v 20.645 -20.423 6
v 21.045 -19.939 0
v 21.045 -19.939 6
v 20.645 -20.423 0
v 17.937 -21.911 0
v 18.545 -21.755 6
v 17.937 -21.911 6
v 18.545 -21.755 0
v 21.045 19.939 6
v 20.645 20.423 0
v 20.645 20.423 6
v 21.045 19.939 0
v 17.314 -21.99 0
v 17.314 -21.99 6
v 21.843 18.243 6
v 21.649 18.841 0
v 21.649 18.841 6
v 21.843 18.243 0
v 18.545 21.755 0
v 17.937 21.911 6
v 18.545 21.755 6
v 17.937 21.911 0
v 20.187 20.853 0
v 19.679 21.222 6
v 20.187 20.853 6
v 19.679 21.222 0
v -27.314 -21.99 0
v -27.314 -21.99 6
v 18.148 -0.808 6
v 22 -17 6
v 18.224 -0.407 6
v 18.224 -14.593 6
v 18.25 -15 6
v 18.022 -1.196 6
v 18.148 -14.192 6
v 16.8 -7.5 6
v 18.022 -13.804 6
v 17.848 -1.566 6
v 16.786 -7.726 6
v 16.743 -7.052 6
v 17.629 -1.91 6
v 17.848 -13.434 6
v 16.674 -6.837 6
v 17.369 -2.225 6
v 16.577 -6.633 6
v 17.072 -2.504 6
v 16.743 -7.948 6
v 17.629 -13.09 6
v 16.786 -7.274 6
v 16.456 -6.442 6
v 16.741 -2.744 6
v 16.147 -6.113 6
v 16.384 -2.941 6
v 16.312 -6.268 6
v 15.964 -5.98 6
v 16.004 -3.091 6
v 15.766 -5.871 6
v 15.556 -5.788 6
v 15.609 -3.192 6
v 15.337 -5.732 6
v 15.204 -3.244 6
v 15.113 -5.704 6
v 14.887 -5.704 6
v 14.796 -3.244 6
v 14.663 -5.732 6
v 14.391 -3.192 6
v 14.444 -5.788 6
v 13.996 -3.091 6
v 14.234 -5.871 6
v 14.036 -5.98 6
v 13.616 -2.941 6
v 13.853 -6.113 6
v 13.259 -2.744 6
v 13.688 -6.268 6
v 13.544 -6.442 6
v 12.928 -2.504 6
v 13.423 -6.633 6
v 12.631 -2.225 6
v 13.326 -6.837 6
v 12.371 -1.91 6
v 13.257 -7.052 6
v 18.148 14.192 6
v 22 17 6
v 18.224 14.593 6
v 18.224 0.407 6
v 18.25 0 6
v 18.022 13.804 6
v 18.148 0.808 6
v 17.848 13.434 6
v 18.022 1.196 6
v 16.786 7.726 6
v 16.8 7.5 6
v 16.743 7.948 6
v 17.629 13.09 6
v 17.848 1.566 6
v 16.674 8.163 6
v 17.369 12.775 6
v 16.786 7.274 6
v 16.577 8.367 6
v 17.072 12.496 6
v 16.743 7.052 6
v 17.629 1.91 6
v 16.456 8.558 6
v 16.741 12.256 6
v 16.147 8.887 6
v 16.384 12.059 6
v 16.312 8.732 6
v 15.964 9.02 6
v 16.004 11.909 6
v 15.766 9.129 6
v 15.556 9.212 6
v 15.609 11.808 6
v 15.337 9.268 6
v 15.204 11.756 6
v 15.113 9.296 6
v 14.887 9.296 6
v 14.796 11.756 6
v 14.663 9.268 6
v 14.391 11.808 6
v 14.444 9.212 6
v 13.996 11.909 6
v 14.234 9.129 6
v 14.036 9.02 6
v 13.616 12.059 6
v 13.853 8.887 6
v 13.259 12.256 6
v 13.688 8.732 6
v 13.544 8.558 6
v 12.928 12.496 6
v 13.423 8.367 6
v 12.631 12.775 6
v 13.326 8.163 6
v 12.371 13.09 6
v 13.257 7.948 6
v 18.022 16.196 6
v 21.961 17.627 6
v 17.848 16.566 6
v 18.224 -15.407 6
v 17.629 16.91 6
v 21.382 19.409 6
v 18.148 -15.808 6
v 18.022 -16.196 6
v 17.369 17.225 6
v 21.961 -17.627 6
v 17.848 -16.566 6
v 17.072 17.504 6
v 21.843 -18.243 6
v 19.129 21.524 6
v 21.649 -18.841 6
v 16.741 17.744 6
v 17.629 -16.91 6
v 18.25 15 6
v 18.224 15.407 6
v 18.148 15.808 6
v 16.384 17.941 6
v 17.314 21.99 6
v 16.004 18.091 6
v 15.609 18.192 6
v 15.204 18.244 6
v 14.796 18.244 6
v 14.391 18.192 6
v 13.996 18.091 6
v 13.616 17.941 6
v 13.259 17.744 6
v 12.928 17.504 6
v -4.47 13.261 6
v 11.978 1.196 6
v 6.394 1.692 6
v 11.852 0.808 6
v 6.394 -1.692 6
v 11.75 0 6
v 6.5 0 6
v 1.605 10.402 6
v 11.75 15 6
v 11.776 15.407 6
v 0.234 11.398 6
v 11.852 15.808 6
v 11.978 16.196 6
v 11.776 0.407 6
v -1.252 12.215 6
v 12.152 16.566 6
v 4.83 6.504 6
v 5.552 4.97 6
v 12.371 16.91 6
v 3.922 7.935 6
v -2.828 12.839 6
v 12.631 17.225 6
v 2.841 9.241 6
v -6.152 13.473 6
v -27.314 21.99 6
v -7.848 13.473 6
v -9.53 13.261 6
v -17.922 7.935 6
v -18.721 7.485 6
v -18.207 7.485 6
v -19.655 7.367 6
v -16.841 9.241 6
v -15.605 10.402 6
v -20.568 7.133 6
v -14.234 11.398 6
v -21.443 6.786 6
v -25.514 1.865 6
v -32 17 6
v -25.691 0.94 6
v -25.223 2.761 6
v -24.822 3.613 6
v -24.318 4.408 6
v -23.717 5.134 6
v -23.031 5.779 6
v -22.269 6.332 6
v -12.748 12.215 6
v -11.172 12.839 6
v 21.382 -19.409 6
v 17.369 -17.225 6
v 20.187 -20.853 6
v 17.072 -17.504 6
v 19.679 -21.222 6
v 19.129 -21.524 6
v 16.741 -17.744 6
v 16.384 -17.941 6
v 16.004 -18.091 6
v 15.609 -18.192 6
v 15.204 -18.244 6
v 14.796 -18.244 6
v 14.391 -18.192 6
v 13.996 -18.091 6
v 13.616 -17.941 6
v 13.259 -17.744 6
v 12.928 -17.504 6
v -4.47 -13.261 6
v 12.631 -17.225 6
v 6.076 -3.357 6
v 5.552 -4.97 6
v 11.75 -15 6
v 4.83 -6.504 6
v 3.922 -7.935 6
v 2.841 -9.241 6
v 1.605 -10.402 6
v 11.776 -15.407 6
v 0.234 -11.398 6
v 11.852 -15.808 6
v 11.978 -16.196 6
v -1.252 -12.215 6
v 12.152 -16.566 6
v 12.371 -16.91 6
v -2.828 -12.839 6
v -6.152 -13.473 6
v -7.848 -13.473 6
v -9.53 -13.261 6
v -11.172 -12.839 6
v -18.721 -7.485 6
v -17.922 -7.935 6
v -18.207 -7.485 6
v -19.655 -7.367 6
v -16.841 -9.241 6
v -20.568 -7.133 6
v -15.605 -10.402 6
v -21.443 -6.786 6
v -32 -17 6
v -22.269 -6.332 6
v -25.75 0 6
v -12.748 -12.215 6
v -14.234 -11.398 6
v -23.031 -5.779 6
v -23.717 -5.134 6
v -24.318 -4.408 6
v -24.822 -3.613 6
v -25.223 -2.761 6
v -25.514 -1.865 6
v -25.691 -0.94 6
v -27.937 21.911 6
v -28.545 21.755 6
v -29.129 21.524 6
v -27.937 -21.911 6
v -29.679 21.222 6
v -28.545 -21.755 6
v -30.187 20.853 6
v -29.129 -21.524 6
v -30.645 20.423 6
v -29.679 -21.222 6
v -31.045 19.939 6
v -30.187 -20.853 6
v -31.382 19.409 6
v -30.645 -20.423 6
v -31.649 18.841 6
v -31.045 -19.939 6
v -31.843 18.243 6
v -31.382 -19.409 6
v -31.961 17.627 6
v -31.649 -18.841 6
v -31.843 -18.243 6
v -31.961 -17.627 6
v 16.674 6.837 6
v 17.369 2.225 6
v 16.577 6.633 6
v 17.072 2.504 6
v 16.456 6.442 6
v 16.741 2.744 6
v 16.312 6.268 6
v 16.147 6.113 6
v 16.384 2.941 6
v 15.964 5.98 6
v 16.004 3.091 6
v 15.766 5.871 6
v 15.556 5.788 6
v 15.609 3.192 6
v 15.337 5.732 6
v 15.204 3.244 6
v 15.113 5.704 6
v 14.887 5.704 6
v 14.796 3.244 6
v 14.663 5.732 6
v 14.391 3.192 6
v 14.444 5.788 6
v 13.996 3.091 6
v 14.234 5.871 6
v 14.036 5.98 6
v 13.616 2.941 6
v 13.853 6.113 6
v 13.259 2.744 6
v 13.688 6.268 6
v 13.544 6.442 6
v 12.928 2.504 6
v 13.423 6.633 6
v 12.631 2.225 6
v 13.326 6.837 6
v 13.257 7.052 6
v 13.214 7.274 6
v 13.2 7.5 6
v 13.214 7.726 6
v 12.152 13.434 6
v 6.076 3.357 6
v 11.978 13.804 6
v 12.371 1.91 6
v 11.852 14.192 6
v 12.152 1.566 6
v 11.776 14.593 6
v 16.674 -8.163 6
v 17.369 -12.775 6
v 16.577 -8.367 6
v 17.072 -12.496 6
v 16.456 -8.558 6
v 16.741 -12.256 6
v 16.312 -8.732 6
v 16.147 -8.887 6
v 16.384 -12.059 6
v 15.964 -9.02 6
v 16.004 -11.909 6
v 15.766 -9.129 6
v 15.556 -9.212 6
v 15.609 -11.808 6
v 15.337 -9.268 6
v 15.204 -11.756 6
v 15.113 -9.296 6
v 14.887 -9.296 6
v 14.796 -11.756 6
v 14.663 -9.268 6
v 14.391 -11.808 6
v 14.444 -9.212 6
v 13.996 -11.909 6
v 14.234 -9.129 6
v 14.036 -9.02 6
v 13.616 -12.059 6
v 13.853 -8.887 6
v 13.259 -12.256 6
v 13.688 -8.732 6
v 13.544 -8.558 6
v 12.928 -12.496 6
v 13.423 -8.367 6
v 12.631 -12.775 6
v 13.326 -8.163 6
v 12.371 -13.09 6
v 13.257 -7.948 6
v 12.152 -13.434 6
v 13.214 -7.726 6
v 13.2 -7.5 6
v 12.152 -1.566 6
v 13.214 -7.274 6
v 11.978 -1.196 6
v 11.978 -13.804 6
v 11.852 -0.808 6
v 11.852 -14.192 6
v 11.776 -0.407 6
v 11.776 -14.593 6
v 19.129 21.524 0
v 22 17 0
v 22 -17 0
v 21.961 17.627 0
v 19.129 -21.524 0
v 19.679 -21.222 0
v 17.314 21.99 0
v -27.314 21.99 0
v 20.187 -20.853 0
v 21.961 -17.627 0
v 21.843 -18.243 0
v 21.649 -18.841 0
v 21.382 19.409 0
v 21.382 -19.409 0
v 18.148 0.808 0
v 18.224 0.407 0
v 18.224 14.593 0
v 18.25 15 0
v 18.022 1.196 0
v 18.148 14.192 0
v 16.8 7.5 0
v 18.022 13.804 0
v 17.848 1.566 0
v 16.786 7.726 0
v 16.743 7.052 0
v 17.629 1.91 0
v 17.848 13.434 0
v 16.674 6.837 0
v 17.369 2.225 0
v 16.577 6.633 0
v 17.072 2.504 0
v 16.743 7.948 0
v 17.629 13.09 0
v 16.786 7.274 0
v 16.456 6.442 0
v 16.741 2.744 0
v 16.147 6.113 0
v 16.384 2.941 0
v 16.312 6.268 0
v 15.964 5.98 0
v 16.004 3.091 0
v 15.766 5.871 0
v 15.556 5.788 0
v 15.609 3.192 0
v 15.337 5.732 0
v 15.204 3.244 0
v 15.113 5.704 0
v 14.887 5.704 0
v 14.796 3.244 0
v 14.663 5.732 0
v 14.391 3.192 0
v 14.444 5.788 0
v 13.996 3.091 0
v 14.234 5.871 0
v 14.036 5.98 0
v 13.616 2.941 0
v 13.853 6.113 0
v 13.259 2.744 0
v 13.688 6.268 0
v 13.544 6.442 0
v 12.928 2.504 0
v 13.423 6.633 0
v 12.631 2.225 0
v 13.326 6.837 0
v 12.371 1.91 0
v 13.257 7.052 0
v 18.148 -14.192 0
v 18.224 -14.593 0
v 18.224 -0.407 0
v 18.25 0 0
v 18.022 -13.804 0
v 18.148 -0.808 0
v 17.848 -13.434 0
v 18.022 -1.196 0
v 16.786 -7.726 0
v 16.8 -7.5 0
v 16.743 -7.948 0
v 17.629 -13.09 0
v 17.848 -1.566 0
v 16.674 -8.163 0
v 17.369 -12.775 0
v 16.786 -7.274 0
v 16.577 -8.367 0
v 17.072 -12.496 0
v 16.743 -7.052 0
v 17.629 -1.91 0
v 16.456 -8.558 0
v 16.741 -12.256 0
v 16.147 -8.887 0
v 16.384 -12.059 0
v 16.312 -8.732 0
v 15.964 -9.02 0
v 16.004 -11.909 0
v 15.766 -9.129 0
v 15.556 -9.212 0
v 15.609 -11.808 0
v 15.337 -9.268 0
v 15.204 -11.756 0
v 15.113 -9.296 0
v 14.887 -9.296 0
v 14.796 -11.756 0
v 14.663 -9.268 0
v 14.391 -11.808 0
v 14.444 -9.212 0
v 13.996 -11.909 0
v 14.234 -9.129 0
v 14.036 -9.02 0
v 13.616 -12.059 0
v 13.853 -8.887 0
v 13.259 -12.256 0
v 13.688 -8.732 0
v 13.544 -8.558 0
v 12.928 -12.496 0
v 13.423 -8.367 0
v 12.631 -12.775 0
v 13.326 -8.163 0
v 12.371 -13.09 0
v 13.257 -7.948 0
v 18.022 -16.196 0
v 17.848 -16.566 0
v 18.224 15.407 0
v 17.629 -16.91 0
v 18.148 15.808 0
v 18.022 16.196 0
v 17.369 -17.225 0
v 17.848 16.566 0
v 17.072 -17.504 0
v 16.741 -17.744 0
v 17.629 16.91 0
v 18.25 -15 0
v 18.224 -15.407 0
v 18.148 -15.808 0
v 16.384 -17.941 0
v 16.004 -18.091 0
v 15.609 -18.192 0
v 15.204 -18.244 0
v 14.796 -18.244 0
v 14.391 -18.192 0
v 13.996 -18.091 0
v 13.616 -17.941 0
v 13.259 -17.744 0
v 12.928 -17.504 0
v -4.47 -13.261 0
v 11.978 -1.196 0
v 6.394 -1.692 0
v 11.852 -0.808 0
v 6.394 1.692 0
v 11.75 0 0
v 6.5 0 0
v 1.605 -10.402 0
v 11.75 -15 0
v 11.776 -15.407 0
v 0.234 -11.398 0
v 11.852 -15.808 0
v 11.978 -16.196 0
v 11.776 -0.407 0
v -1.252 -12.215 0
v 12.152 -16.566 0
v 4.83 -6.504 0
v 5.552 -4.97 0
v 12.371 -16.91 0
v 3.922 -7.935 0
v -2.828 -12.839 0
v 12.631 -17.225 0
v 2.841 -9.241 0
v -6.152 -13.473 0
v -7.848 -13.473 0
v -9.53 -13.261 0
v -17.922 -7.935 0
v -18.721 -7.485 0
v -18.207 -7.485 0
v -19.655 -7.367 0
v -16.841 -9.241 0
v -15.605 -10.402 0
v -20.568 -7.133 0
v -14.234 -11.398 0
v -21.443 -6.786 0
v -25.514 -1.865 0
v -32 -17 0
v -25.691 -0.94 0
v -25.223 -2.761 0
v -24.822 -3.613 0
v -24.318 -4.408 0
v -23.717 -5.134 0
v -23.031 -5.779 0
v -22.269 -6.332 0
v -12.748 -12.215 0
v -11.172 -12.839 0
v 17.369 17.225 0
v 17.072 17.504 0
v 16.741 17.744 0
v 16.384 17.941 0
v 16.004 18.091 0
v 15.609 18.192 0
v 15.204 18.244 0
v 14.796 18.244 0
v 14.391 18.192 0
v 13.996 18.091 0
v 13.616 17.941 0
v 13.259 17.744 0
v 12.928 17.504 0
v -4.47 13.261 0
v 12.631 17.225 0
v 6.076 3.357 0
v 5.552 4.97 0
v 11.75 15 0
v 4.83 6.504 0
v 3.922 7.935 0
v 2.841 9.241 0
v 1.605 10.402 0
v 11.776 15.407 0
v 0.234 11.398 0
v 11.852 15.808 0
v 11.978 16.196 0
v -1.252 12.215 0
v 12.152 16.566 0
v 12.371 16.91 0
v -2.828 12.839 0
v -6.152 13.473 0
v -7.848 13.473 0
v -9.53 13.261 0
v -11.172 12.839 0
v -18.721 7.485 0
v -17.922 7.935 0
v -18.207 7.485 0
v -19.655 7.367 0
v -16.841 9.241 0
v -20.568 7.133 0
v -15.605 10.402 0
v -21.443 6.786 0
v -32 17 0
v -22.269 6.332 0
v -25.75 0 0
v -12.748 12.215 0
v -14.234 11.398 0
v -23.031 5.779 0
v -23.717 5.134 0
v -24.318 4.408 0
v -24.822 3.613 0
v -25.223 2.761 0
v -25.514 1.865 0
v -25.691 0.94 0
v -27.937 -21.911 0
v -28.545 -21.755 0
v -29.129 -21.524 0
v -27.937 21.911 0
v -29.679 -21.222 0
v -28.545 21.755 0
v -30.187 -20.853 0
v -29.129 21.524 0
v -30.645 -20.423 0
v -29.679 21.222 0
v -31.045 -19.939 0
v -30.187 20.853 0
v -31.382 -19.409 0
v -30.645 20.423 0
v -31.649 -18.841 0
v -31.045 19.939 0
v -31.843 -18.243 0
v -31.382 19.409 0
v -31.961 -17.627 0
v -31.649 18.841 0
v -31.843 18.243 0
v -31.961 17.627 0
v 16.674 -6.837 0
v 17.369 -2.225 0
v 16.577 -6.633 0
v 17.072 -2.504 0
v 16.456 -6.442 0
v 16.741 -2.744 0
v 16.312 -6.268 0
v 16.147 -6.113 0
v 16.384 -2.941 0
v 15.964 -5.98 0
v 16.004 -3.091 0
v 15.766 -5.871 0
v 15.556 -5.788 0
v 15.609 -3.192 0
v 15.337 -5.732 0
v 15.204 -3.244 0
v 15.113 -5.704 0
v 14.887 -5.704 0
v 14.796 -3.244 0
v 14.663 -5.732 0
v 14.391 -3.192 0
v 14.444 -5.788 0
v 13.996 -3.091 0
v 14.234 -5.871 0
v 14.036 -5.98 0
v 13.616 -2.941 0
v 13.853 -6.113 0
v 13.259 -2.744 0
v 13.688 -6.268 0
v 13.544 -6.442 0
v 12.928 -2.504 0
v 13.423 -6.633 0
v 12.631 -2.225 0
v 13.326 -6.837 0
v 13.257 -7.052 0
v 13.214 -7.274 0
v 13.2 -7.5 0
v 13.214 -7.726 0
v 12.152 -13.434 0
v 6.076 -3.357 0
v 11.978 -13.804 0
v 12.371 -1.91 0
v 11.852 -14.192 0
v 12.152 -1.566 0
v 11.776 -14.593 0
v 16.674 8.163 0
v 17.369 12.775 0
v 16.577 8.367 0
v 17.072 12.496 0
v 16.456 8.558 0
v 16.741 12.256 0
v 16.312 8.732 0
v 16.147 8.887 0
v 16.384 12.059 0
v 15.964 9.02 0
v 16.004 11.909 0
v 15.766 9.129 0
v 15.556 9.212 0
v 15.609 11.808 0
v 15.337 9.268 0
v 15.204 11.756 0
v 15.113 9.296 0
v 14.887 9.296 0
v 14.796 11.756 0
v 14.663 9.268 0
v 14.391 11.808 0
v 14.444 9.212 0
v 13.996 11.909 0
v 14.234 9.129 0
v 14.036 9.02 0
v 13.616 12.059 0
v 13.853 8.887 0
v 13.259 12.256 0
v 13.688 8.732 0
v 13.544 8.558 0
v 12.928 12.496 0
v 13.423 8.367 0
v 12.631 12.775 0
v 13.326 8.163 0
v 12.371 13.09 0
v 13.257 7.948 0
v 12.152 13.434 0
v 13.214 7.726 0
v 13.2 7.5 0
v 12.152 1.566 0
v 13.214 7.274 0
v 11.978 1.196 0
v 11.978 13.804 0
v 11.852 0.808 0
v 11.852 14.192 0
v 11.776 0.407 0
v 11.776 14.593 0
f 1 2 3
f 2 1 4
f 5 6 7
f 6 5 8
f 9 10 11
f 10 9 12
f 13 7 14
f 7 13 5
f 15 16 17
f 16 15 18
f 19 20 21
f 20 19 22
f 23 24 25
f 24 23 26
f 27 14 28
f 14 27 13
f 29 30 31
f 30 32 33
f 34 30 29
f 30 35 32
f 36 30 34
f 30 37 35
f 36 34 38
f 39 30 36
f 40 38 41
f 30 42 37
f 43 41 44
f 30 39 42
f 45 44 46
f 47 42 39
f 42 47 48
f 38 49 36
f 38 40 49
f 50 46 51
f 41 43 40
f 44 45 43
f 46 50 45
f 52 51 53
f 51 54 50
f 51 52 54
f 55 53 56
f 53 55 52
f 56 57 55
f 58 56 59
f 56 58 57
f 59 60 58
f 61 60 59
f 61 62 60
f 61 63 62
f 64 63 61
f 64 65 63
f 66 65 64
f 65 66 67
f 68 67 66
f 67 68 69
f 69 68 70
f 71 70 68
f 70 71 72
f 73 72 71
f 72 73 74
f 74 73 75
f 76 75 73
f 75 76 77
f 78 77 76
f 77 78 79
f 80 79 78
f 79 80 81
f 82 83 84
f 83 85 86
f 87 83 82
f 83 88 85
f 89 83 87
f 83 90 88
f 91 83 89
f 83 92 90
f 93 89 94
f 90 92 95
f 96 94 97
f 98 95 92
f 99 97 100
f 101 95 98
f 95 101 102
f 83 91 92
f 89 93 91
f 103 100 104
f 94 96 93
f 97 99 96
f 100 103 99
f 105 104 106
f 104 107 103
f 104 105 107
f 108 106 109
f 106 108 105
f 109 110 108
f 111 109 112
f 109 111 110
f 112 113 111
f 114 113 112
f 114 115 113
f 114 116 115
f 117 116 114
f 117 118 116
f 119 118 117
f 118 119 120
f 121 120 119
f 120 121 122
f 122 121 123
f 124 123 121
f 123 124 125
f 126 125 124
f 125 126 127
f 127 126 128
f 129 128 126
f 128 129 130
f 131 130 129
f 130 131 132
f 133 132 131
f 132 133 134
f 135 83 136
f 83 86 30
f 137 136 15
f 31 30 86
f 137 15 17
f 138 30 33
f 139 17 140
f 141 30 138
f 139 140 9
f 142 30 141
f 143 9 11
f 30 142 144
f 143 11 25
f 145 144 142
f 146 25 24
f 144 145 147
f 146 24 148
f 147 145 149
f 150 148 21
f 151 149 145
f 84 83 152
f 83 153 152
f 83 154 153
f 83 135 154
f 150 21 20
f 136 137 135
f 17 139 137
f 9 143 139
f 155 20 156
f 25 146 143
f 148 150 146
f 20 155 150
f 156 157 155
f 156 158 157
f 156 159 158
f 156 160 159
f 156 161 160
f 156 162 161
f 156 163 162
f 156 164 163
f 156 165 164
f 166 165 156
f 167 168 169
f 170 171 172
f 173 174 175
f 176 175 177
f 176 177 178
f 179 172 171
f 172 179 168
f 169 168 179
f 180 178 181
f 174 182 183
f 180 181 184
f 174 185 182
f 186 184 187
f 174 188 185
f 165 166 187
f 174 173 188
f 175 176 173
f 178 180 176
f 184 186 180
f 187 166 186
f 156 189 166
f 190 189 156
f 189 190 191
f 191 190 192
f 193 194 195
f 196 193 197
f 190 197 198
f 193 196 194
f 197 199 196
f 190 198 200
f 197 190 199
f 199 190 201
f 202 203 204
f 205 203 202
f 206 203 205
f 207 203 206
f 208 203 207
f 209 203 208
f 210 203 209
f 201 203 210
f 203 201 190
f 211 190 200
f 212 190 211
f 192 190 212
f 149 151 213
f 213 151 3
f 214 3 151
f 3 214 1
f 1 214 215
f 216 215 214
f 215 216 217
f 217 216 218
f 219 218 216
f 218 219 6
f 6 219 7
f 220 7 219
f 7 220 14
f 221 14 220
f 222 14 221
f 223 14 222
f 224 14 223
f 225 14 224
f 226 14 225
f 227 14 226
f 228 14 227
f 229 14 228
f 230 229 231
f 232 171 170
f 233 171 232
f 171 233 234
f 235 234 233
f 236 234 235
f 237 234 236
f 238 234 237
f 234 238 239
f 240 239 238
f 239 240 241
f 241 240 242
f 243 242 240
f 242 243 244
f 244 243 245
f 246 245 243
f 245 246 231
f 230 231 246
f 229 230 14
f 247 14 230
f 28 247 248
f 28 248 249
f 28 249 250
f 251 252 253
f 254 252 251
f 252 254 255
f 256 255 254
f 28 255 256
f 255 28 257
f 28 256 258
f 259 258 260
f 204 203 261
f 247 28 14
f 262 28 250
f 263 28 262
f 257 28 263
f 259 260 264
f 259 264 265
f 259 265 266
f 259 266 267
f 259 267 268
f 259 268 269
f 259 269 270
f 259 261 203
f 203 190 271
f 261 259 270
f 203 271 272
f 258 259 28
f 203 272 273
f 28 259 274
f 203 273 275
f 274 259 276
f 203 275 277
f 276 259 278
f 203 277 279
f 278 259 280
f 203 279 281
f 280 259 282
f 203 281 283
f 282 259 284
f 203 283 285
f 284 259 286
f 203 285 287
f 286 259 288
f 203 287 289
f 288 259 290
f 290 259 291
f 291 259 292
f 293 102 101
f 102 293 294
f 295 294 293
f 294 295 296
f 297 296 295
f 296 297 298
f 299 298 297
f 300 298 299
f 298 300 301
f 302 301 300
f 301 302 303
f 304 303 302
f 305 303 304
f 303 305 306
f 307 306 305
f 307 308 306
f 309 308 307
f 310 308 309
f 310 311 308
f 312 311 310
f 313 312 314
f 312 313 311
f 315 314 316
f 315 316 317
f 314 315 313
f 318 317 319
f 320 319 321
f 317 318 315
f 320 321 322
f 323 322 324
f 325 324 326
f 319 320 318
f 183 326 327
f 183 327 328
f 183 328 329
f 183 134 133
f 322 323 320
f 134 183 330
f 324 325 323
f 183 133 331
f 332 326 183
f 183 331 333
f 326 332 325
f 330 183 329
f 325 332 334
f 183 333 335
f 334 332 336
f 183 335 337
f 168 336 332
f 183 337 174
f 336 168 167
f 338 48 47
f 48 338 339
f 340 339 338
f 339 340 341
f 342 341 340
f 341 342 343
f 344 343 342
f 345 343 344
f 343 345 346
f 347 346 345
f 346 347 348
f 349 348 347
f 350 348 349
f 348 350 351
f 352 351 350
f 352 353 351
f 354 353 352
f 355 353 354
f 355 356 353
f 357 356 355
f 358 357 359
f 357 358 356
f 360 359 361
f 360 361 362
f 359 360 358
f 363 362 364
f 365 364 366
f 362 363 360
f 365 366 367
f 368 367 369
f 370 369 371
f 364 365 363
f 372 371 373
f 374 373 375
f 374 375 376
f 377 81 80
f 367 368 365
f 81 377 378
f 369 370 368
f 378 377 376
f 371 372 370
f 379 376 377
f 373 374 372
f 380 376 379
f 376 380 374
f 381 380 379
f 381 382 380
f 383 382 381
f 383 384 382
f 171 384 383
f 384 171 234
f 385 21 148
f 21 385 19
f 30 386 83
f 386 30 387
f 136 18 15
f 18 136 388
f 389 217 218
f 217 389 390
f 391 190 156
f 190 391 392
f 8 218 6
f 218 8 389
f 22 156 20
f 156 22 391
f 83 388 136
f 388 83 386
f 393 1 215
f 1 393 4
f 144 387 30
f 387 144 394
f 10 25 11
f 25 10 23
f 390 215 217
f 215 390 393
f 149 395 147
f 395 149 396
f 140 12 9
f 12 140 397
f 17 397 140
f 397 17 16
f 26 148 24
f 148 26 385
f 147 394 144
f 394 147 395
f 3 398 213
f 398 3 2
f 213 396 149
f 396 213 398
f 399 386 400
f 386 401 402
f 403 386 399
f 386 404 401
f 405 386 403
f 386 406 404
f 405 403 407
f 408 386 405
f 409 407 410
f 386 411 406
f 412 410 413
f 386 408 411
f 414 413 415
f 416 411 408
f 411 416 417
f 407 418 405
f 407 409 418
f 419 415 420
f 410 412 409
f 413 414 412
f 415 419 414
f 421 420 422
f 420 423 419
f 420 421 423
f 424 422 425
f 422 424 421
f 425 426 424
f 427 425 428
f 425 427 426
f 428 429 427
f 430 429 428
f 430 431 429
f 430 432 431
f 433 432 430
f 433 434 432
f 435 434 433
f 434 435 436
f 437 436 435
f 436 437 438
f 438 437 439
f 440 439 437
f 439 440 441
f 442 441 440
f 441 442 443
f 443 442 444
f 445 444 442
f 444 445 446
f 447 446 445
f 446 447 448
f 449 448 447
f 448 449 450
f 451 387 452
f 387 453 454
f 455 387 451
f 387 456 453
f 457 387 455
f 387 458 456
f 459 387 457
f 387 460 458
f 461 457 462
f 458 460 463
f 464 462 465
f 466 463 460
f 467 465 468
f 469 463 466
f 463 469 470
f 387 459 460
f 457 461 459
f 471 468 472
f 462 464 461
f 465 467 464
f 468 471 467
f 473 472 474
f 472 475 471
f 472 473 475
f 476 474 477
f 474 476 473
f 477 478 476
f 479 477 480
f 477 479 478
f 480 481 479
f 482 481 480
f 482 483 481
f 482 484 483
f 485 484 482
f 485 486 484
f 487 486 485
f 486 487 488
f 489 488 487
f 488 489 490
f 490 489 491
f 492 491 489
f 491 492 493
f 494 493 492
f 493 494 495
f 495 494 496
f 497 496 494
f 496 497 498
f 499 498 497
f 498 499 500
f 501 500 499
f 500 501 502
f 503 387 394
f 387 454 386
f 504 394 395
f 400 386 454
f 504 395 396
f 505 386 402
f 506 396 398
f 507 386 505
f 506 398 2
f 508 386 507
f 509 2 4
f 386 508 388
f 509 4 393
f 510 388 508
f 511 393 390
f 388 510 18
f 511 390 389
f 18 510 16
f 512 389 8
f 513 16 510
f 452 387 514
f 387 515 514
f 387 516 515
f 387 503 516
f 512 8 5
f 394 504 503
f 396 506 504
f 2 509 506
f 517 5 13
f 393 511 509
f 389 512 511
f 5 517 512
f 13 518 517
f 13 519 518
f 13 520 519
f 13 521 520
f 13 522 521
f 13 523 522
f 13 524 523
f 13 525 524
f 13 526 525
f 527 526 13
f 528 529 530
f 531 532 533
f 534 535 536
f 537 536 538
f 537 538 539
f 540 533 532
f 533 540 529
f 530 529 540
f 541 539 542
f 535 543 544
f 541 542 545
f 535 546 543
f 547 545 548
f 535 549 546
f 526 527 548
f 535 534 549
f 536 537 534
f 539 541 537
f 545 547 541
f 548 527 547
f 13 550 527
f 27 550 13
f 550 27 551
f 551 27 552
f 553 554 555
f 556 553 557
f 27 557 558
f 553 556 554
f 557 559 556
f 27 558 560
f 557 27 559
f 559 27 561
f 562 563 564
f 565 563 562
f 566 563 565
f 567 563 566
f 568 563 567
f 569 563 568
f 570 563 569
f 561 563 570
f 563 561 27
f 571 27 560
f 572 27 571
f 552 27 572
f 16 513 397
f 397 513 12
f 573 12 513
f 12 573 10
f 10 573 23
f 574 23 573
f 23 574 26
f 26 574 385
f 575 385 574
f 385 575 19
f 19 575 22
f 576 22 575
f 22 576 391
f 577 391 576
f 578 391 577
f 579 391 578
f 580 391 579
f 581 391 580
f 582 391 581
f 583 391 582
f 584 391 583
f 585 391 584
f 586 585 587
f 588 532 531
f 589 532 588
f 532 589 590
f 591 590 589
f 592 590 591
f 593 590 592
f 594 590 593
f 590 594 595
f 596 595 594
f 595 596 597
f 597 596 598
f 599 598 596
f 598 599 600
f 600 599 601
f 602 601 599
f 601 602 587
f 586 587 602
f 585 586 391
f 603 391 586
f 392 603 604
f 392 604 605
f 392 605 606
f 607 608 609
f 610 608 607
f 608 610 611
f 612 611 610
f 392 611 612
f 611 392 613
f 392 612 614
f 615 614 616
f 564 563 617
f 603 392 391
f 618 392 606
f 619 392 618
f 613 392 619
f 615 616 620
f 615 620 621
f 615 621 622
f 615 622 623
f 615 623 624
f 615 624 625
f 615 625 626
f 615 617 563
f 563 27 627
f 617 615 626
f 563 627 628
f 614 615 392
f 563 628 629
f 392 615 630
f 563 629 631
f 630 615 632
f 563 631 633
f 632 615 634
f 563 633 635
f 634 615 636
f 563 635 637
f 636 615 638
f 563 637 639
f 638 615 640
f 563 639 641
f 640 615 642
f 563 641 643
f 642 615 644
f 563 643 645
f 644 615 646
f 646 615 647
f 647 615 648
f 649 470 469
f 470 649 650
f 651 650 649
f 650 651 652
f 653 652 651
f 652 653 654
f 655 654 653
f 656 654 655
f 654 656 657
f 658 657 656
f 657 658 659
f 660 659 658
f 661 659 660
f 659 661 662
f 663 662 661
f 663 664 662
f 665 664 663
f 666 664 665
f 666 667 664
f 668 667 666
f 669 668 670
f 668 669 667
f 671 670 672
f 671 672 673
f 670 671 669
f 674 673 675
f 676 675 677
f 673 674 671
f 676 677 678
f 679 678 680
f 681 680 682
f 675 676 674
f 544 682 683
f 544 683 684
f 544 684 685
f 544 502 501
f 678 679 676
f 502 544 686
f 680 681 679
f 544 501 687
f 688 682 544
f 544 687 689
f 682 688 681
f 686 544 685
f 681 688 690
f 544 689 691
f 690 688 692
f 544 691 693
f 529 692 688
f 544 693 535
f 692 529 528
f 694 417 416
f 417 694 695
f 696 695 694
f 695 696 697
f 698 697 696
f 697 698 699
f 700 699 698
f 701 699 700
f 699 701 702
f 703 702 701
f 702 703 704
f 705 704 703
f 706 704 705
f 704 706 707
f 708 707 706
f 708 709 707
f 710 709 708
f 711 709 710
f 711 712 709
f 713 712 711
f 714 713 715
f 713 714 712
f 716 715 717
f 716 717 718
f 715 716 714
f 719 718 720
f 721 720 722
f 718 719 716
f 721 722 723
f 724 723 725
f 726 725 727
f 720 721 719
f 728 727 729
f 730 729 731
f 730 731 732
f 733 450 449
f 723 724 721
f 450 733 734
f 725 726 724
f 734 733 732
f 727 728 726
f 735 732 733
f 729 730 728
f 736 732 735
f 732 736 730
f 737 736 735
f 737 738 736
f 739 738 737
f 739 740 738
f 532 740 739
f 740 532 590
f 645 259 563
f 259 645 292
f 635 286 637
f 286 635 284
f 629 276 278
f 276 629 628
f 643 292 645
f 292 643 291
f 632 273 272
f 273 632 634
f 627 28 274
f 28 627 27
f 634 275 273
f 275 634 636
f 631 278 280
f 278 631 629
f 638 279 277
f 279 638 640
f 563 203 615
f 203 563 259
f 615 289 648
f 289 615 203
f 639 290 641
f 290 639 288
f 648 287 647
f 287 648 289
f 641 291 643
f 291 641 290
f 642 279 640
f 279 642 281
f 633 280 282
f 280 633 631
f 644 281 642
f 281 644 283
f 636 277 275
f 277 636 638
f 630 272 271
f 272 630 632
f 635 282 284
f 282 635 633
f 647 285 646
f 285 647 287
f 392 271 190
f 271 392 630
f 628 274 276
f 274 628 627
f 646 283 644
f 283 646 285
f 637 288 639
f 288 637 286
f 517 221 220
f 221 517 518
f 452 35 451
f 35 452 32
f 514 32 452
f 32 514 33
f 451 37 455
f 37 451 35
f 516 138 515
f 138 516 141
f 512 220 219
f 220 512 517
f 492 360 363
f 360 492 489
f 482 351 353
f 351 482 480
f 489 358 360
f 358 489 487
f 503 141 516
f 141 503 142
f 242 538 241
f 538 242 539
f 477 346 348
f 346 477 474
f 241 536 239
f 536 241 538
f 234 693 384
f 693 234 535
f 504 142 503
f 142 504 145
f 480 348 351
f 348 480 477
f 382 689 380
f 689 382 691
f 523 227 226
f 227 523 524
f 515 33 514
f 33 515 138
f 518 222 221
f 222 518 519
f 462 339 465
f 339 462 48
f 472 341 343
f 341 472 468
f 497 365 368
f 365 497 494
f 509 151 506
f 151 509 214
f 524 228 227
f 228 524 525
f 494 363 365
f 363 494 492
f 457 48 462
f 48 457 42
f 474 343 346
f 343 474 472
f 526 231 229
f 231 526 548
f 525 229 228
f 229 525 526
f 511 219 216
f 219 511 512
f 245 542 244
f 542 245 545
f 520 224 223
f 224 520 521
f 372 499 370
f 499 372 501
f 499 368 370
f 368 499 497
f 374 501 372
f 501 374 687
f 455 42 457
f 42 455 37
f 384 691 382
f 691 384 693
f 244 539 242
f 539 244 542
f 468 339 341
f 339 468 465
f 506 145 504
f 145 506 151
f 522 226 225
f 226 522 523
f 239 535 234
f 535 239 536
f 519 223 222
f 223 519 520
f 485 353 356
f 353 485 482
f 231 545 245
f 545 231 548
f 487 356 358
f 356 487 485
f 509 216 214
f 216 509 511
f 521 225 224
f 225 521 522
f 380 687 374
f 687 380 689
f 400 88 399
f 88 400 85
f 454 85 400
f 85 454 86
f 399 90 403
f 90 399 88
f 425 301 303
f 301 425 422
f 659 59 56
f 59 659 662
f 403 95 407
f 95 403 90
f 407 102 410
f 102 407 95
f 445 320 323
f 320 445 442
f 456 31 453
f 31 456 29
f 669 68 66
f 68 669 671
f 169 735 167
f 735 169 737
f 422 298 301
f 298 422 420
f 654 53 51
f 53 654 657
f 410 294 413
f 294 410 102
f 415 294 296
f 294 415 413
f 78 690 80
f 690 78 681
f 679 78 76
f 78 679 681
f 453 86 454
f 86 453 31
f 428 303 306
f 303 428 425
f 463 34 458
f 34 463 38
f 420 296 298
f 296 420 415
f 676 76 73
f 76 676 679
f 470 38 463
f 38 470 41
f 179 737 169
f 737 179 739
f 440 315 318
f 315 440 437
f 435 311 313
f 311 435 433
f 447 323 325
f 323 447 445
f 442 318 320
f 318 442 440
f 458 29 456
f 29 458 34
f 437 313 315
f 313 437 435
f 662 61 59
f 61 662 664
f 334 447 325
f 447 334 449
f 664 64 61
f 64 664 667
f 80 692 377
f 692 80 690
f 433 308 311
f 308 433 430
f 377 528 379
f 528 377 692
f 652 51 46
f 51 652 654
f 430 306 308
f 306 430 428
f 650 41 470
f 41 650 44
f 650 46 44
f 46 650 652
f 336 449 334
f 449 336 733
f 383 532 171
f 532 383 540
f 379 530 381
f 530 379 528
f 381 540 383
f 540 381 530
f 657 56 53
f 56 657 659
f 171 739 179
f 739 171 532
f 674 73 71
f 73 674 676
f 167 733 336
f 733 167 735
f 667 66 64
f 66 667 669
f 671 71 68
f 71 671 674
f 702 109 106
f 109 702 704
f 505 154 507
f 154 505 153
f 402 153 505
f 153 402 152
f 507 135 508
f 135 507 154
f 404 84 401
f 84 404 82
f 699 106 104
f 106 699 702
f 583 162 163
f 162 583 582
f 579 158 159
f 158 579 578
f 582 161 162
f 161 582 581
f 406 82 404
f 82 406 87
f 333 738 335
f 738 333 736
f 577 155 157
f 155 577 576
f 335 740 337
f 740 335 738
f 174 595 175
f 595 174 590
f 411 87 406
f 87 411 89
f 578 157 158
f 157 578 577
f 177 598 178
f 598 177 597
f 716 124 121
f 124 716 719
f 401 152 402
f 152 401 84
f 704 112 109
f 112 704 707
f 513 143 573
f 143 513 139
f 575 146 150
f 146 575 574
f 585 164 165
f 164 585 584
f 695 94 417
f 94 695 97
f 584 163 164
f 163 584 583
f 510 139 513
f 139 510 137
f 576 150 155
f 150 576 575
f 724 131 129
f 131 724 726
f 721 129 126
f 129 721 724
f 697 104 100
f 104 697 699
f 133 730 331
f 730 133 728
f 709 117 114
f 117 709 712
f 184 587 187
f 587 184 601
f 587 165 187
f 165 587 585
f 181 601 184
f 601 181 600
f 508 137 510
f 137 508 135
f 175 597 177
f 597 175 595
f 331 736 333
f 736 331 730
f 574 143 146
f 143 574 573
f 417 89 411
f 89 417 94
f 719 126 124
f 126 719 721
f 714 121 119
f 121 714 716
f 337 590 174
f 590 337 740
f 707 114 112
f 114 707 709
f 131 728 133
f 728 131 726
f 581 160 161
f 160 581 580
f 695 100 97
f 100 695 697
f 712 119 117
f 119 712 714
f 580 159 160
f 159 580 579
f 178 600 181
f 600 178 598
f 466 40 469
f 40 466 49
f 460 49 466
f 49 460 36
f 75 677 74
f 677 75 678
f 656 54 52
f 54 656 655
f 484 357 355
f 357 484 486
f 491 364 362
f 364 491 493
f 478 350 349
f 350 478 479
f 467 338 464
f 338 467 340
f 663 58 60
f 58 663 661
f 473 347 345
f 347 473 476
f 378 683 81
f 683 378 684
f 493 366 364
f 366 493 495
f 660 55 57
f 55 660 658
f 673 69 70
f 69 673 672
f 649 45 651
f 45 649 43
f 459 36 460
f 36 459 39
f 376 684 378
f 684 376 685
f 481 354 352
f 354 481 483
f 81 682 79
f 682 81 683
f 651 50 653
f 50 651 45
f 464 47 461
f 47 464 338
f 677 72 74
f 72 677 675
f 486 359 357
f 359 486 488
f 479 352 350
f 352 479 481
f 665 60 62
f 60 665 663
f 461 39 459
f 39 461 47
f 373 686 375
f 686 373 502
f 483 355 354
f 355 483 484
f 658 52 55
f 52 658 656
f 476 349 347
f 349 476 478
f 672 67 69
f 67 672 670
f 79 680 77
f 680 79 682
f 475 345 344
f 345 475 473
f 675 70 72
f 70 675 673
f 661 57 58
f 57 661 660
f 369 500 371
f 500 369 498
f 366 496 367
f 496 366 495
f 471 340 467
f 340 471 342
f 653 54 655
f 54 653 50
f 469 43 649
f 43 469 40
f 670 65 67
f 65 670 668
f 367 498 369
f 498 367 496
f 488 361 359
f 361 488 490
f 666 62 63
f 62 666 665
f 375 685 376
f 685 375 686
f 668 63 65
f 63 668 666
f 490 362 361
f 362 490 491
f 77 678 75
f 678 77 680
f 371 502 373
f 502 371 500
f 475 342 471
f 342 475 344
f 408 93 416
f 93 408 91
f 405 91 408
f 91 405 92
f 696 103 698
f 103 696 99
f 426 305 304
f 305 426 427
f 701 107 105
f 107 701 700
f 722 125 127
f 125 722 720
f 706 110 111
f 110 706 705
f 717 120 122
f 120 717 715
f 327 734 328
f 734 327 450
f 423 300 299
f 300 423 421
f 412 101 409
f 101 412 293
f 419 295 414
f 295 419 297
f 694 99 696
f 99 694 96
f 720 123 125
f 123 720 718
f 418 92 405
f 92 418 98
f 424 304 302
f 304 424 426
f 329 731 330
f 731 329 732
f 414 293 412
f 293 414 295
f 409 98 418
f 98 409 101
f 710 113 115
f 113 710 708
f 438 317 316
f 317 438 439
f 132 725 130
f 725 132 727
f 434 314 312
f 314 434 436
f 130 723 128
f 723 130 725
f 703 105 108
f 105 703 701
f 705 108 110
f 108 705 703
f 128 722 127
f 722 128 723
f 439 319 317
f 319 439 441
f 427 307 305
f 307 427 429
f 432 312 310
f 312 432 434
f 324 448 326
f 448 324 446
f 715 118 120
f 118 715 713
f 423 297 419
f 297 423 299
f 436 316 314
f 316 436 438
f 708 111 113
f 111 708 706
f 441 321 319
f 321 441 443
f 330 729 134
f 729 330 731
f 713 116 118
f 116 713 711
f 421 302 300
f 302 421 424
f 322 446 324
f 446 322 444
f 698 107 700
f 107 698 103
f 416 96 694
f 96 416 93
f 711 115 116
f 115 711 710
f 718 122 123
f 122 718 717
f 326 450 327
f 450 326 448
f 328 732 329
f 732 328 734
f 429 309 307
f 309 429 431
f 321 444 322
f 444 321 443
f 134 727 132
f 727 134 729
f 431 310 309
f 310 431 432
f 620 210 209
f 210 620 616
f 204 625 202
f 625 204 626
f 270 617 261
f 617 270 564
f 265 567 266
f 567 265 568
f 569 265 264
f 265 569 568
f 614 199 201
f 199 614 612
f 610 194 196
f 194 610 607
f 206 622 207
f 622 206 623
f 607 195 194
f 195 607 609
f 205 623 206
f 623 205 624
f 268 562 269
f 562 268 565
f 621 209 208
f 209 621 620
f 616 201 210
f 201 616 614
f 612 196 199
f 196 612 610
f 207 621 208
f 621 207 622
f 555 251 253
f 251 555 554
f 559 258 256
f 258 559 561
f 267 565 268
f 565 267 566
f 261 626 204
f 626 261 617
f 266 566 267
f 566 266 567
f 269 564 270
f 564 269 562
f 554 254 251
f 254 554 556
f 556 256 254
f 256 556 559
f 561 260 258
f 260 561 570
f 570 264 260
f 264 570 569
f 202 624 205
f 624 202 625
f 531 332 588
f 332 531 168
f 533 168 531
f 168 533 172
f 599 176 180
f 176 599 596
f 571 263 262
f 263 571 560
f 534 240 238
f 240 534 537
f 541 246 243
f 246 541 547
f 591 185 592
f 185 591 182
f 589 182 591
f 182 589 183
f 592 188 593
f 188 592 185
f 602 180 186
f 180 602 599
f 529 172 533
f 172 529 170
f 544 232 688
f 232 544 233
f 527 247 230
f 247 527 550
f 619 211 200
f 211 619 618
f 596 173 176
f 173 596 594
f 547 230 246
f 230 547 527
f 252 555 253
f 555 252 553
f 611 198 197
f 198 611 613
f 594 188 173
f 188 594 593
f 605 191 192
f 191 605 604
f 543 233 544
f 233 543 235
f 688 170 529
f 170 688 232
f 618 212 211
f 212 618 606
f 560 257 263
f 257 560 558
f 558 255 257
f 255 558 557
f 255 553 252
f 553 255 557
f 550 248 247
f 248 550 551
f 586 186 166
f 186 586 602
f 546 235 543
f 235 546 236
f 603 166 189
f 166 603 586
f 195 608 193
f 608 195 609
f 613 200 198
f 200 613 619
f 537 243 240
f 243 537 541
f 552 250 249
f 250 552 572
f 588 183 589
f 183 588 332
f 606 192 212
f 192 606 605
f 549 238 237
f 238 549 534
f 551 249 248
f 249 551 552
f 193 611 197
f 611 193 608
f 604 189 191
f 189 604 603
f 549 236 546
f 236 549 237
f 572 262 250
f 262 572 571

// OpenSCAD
$fn = 50;


difference() {
	union() {
		hull() {
			translate(v = [-17.0000000000, 17.0000000000, 0]) {
				cylinder(h = 6, r = 5);
			}
			translate(v = [17.0000000000, 17.0000000000, 0]) {
				cylinder(h = 6, r = 5);
			}
			translate(v = [-17.0000000000, -17.0000000000, 0]) {
				cylinder(h = 6, r = 5);
			}
			translate(v = [17.0000000000, -17.0000000000, 0]) {
				cylinder(h = 6, r = 5);
			}
		}
		translate(v = [-10.0000000000, 0, 0]) {
			hull() {
				translate(v = [-17.0000000000, 17.0000000000, 0]) {
					cylinder(h = 6, r = 5);
				}
				translate(v = [17.0000000000, 17.0000000000, 0]) {
					cylinder(h = 6, r = 5);
				}
				translate(v = [-17.0000000000, -17.0000000000, 0]) {
					cylinder(h = 6, r = 5);
				}
				translate(v = [17.0000000000, -17.0000000000, 0]) {
					cylinder(h = 6, r = 5);
				}
			}
		}
	}
	union() {
		translate(v = [15.0000000000, -15.0000000000, -100.0000000000]) {
			cylinder(h = 200, r = 3.2500000000);
		}
		translate(v = [15.0000000000, 0.0000000000, -100.0000000000]) {
			cylinder(h = 200, r = 3.2500000000);
		}
		translate(v = [15.0000000000, 15.0000000000, -100.0000000000]) {
			cylinder(h = 200, r = 3.2500000000);
		}
		translate(v = [15.0000000000, -15.0000000000, -100.0000000000]) {
			cylinder(h = 200, r = 3.2500000000);
		}
		translate(v = [15.0000000000, 0.0000000000, -100.0000000000]) {
			cylinder(h = 200, r = 3.2500000000);
		}
		translate(v = [15.0000000000, 15.0000000000, -100.0000000000]) {
			cylinder(h = 200, r = 3.2500000000);
		}
		translate(v = [15.0000000000, -15.0000000000, -100.0000000000]) {
			cylinder(h = 200, r = 1.8000000000);
		}
		translate(v = [15.0000000000, -7.5000000000, -100.0000000000]) {
			cylinder(h = 200, r = 1.8000000000);
		}
		translate(v = [15.0000000000, 0.0000000000, -100.0000000000]) {
			cylinder(h = 200, r = 1.8000000000);
		}
		translate(v = [15.0000000000, 7.5000000000, -100.0000000000]) {
			cylinder(h = 200, r = 1.8000000000);
		}
		translate(v = [15.0000000000, 15.0000000000, -100.0000000000]) {
			cylinder(h = 200, r = 1.8000000000);
		}
		translate(v = [15.0000000000, -15.0000000000, -100.0000000000]) {
			cylinder(h = 200, r = 1.8000000000);
		}
		translate(v = [15.0000000000, -7.5000000000, -100.0000000000]) {
			cylinder(h = 200, r = 1.8000000000);
		}
		translate(v = [15.0000000000, 0.0000000000, -100.0000000000]) {
			cylinder(h = 200, r = 1.8000000000);
		}
		translate(v = [15.0000000000, 7.5000000000, -100.0000000000]) {
			cylinder(h = 200, r = 1.8000000000);
		}
		translate(v = [15.0000000000, 15.0000000000, -100.0000000000]) {
			cylinder(h = 200, r = 1.8000000000);
		}
		translate(v = [15.0000000000, -15.0000000000, -100.0000000000]) {
			cylinder(h = 200, r = 1.8000000000);
		}
		translate(v = [15.0000000000, -7.5000000000, -100.0000000000]) {
			cylinder(h = 200, r = 1.8000000000);
		}
		translate(v = [15.0000000000, 0.0000000000, -100.0000000000]) {
			cylinder(h = 200, r = 1.8000000000);
		}
		translate(v = [15.0000000000, 7.5000000000, -100.0000000000]) {
			cylinder(h = 200, r = 1.8000000000);
		}
		translate(v = [15.0000000000, 15.0000000000, -100.0000000000]) {
			cylinder(h = 200, r = 1.8000000000);
		}
		translate(v = [-14.5000000000, 0, 0]) {
			hull() {
				translate(v = [-3.7500000000, 0.0000000000, 0]) {
					cylinder(h = 6, r = 7.5000000000);
				}
				translate(v = [3.7500000000, 0.0000000000, 0]) {
					cylinder(h = 6, r = 7.5000000000);
				}
				translate(v = [-3.7500000000, -0.0000000000, 0]) {
					cylinder(h = 6, r = 7.5000000000);
				}
				translate(v = [3.7500000000, -0.0000000000, 0]) {
					cylinder(h = 6, r = 7.5000000000);
				}
			}
		}
		translate(v = [-7.0000000000, 0, 0.0000000000]) {
			cylinder(h = 6, r = 13.5000000000);
		}
	}
}
